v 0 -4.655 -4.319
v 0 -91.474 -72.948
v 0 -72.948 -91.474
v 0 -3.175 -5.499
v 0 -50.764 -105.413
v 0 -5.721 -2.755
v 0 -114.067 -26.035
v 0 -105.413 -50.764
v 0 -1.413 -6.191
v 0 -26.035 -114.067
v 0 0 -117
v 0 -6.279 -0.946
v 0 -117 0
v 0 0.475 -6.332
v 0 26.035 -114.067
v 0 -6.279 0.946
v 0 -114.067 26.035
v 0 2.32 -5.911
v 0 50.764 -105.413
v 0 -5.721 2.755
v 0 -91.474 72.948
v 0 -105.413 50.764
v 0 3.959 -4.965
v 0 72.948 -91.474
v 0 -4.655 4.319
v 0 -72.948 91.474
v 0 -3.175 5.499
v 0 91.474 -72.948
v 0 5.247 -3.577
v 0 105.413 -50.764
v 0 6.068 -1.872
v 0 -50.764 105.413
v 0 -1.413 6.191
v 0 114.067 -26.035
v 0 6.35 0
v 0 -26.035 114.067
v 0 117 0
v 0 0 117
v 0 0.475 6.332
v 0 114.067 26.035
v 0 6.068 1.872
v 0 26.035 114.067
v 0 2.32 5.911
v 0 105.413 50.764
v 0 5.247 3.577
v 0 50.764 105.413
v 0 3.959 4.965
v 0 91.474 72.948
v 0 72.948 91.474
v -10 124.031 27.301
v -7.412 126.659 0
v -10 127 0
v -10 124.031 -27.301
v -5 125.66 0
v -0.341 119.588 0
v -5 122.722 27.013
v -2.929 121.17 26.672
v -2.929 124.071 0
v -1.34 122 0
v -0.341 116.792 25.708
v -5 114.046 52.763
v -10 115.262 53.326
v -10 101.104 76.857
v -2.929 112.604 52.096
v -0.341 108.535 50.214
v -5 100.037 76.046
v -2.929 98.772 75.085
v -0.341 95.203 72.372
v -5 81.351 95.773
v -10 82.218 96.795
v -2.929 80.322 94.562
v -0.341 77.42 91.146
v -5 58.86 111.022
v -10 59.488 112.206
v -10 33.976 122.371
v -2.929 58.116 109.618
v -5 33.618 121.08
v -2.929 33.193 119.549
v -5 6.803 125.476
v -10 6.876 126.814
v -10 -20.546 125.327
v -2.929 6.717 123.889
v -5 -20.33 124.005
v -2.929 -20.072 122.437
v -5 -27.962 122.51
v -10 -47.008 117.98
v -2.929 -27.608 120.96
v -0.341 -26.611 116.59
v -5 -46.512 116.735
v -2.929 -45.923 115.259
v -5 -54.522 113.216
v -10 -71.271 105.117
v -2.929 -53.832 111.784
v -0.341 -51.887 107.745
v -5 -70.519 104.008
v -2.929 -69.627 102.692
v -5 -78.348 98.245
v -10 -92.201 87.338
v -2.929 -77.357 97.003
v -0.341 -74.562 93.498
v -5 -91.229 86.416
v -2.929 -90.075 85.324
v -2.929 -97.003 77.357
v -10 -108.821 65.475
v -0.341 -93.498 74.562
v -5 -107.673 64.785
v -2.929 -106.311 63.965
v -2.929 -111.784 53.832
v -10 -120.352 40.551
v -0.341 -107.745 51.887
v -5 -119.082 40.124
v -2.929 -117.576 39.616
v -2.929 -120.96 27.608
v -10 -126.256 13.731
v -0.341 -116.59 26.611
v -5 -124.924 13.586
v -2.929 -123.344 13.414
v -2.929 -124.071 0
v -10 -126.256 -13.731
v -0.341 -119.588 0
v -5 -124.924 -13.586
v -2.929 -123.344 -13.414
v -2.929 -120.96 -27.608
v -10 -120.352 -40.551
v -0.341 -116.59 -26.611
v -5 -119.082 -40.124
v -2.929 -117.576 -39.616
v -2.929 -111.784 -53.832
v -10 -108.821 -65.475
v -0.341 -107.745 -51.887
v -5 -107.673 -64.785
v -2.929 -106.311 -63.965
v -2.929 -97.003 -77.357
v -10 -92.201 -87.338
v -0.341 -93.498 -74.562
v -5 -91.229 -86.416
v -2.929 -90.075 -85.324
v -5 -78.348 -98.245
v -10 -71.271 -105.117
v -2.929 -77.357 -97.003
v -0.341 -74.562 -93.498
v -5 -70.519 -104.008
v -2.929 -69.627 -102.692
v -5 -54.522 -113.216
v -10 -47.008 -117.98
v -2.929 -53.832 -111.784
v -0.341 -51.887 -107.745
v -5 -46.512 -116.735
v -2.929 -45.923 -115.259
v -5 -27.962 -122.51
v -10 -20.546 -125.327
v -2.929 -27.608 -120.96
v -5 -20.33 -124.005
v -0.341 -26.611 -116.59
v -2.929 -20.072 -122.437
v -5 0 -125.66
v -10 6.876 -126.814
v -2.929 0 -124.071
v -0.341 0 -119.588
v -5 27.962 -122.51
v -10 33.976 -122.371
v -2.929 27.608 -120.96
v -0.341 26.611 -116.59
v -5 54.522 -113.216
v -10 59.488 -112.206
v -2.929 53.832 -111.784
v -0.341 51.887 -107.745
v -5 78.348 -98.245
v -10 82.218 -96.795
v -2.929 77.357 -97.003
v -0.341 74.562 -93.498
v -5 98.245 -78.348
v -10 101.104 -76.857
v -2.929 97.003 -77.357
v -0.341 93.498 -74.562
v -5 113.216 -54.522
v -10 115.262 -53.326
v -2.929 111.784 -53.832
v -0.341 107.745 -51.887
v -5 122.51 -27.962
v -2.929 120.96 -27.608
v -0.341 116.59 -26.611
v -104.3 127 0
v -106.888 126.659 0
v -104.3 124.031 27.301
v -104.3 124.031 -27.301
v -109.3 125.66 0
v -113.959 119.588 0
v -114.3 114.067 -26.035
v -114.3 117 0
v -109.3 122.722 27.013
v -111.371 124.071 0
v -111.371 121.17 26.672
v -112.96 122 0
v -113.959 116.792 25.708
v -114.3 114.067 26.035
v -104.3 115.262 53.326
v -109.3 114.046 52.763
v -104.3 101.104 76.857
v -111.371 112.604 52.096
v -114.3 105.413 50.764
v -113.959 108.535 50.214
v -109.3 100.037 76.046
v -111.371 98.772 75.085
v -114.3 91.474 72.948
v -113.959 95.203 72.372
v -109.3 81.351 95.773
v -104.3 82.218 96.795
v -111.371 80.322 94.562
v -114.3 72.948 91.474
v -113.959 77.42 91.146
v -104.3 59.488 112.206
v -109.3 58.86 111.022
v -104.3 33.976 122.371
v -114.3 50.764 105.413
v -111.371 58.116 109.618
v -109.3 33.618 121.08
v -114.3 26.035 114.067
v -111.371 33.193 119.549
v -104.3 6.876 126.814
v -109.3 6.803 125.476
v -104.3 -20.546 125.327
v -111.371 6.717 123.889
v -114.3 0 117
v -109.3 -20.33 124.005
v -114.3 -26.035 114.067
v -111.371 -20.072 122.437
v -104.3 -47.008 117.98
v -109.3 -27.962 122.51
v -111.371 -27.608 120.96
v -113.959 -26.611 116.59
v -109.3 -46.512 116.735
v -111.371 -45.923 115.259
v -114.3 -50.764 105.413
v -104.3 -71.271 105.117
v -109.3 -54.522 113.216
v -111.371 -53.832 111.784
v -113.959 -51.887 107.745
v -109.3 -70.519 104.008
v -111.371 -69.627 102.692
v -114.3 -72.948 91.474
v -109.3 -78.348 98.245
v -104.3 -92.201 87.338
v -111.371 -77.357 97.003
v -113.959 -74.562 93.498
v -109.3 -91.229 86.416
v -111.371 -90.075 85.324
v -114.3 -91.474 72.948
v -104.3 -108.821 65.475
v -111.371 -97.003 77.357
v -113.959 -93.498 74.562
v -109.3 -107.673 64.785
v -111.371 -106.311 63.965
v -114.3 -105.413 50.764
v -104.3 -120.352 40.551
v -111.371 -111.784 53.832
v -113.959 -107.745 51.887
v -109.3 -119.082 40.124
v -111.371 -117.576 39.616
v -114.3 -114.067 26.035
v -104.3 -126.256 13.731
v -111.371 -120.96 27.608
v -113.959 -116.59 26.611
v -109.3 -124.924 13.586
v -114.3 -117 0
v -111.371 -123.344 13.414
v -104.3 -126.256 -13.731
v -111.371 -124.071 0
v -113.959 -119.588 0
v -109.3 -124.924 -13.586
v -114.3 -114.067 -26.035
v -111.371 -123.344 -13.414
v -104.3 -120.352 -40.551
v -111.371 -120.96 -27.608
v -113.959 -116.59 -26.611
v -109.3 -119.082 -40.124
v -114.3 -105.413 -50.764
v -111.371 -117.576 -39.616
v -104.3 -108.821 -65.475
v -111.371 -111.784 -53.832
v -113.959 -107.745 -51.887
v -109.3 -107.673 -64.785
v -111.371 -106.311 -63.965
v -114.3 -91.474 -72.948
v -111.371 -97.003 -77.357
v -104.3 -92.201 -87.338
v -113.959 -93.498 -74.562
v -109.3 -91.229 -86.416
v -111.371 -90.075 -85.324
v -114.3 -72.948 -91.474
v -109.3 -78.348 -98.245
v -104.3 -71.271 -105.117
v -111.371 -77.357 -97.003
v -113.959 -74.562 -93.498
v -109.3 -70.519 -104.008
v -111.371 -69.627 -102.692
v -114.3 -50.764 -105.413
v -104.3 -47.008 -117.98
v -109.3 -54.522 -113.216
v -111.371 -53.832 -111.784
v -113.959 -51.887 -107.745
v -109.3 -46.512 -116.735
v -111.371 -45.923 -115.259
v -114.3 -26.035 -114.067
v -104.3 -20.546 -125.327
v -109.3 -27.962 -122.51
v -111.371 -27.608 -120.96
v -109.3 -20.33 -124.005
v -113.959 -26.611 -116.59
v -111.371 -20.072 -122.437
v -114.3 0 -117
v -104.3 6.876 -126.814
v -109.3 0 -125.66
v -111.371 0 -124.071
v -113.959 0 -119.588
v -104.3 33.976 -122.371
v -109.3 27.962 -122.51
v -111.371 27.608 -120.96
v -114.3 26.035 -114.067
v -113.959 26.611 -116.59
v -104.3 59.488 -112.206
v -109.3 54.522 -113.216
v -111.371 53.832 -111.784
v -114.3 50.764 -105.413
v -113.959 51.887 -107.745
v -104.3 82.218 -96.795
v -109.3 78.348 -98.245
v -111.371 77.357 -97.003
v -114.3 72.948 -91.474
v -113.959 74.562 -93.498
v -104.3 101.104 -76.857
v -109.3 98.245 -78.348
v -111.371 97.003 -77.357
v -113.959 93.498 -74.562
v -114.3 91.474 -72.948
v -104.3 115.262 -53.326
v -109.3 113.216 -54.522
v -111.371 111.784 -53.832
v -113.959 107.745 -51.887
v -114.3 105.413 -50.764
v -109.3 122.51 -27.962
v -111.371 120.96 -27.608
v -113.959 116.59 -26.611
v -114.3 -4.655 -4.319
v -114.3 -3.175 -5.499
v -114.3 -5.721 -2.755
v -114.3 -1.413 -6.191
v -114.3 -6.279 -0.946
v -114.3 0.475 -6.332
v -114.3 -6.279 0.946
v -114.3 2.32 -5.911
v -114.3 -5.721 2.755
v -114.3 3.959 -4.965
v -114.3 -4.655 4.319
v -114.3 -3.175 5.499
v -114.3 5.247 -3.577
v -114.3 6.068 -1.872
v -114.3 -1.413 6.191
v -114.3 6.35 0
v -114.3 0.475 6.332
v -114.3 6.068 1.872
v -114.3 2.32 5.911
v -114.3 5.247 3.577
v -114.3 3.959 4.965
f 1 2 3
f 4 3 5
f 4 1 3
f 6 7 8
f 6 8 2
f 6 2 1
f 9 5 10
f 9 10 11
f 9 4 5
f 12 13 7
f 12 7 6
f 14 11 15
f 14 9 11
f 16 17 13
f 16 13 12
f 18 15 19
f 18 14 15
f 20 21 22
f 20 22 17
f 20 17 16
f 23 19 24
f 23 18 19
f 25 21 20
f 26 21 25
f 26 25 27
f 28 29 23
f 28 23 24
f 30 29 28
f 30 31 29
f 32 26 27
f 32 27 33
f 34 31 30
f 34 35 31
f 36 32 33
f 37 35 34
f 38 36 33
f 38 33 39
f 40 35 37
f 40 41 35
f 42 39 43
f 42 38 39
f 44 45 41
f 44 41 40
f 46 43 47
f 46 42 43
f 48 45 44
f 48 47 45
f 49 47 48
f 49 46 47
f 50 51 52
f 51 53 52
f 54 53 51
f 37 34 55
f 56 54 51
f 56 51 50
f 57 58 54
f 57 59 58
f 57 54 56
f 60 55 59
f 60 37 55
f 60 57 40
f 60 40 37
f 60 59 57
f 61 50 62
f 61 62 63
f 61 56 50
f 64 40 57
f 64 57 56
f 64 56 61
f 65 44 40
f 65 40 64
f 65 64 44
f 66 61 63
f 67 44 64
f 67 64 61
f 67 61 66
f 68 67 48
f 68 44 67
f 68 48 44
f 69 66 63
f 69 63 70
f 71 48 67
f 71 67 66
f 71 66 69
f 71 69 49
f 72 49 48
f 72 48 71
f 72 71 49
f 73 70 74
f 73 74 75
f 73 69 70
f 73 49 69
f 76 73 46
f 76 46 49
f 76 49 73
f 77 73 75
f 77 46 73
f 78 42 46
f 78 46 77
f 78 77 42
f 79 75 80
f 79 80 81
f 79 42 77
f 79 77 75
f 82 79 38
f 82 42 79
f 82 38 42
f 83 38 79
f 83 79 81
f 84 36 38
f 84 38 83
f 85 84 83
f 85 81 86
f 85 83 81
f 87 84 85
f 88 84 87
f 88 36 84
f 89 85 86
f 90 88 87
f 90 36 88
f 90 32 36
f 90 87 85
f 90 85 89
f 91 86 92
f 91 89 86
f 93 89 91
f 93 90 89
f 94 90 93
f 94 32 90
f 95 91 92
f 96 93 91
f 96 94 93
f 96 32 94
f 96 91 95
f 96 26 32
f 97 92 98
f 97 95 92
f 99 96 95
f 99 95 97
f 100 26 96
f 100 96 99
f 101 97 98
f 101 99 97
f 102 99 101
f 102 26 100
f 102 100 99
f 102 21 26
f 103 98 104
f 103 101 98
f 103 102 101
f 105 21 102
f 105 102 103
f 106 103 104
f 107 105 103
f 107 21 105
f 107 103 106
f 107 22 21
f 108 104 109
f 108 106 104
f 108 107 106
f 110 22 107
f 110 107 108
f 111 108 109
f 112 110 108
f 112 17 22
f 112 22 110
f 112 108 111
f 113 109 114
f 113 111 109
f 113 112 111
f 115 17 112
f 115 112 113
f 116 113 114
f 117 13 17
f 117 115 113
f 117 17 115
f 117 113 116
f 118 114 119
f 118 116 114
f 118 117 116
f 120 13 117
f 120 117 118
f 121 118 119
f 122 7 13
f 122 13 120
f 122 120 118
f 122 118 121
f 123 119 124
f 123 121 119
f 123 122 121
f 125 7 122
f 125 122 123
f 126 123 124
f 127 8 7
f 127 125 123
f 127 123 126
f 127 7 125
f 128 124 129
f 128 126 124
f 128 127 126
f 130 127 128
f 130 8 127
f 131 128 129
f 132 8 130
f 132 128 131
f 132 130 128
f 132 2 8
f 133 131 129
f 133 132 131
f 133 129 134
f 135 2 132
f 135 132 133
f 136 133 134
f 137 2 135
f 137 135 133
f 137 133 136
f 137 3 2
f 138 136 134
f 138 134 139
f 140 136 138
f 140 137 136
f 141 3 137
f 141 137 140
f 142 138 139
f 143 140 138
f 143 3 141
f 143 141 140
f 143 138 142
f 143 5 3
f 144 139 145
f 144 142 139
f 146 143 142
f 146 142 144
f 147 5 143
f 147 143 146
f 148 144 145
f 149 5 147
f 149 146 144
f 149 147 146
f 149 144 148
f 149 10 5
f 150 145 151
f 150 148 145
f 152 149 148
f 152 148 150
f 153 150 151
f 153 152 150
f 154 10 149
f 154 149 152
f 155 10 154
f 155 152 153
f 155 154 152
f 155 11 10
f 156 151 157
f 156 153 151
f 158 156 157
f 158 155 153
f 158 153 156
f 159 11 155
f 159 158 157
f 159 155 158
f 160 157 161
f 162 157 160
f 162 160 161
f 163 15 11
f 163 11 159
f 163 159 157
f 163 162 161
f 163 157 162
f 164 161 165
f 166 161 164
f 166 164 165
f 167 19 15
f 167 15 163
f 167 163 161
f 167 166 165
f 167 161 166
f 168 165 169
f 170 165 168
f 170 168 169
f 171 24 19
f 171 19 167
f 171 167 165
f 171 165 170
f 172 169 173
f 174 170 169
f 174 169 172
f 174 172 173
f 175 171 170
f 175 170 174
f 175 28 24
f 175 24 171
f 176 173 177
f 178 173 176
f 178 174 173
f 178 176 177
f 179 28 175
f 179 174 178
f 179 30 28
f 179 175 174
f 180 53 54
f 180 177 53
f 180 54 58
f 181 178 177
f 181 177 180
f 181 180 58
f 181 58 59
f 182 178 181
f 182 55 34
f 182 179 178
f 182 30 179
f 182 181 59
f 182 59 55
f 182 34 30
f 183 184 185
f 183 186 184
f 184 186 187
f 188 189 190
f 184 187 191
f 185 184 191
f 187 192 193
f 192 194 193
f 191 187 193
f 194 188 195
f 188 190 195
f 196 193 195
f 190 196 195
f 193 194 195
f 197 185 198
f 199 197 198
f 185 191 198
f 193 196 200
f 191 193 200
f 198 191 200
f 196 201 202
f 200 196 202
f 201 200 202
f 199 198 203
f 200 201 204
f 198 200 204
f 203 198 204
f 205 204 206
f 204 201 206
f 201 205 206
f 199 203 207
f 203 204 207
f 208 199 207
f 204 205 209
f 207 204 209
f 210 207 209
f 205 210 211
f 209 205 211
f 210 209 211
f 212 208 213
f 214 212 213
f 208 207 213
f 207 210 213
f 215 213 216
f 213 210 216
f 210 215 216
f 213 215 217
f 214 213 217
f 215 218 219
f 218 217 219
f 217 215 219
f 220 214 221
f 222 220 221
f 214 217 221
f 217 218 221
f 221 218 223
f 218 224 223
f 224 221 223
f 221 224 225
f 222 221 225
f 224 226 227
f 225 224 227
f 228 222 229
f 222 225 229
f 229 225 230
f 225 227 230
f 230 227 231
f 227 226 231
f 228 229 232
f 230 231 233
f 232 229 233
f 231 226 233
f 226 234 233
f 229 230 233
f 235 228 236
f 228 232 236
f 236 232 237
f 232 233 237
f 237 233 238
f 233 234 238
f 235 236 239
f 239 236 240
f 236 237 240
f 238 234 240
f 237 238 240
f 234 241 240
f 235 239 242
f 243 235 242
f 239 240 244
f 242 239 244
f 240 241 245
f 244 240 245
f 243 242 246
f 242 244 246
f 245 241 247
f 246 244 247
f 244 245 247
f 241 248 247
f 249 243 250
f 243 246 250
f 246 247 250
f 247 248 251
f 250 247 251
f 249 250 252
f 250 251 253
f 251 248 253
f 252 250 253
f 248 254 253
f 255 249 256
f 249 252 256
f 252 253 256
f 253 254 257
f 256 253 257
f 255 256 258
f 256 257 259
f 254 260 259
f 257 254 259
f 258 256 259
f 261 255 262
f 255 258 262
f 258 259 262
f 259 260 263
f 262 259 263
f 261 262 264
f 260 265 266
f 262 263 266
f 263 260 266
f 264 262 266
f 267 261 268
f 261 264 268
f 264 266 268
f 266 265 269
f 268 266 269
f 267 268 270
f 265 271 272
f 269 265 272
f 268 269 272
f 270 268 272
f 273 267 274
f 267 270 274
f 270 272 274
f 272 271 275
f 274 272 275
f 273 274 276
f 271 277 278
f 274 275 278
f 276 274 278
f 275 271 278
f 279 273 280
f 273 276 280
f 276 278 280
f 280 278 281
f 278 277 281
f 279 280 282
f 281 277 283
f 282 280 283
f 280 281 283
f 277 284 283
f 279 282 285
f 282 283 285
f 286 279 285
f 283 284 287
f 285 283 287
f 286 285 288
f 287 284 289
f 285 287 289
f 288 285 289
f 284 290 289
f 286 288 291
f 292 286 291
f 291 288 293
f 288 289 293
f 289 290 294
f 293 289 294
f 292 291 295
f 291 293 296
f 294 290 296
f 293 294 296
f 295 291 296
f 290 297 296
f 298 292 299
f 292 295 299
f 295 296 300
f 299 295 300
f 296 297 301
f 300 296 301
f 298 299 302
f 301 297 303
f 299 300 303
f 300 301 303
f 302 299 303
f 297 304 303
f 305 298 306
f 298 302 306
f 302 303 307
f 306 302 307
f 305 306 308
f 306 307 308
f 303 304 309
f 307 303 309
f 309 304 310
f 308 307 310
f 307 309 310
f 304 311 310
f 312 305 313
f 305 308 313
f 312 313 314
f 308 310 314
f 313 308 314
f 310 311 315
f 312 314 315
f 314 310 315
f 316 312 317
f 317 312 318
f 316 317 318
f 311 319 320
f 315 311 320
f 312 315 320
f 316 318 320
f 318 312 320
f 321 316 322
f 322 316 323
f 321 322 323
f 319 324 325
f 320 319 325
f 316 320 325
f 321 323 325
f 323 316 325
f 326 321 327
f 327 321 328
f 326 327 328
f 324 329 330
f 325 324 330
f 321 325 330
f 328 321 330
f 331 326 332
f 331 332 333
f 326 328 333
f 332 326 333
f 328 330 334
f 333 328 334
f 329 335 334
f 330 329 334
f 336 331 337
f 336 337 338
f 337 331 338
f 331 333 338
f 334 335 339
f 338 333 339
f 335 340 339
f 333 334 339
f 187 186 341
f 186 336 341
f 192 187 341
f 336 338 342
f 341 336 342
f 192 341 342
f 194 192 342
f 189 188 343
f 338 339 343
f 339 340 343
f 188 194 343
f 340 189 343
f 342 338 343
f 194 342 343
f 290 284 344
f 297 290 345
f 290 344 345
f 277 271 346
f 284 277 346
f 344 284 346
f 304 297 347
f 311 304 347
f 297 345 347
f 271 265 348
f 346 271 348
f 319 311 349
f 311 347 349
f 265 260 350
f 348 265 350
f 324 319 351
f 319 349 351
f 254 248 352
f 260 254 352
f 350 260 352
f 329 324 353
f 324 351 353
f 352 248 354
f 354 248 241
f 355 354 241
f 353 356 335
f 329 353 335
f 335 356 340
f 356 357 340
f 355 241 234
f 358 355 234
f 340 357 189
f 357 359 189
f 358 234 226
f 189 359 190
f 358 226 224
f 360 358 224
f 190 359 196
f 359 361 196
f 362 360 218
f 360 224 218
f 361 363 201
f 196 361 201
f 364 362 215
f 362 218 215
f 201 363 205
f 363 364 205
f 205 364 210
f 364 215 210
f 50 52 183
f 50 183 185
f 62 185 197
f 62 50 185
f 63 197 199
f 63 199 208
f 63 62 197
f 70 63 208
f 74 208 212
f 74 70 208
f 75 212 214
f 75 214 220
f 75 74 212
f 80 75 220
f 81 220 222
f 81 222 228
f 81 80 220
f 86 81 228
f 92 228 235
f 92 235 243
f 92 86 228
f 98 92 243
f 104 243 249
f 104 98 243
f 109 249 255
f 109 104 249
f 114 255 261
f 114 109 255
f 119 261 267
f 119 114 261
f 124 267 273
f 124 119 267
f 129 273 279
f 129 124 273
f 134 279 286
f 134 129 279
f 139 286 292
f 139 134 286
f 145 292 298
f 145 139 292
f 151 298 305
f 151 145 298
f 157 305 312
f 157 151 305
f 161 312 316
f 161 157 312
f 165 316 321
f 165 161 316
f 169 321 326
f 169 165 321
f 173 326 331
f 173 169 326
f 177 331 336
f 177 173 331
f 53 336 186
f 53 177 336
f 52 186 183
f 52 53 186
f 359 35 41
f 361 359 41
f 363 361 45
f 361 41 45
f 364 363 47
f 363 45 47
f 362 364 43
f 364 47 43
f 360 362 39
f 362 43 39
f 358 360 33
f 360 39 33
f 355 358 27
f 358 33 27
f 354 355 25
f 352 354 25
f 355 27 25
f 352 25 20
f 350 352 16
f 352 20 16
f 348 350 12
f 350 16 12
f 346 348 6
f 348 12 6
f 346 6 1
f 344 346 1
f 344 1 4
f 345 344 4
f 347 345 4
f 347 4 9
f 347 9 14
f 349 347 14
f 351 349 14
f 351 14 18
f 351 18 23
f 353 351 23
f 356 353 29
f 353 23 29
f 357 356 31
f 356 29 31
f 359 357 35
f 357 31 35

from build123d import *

# Parameters (mm, degrees)
F0_R     = 127
F1_DEPTH = 114.3
F2_R     = 10
F3_R     = 6.35
F4_DEPTH = 114.3


with BuildPart() as f1:
    # F0 (on Right) → F1 (new body)
    with BuildSketch(Plane.YZ):
        Circle(F0_R)
    extrude(amount=-F1_DEPTH)

    # F2
    f2_edges = [f1.edges().sort_by_distance(p)[0] for p in [
        (0, -127, 0),
        (-114.3, -127, 0),
    ]]
    fillet(f2_edges, radius=F2_R)

    # F3 (on face) → F4 (cut, through all)
    with BuildSketch(Plane.YZ):
        Circle(F3_R)
    extrude(amount=-F4_DEPTH, mode=Mode.SUBTRACT)


solid = f1.part
